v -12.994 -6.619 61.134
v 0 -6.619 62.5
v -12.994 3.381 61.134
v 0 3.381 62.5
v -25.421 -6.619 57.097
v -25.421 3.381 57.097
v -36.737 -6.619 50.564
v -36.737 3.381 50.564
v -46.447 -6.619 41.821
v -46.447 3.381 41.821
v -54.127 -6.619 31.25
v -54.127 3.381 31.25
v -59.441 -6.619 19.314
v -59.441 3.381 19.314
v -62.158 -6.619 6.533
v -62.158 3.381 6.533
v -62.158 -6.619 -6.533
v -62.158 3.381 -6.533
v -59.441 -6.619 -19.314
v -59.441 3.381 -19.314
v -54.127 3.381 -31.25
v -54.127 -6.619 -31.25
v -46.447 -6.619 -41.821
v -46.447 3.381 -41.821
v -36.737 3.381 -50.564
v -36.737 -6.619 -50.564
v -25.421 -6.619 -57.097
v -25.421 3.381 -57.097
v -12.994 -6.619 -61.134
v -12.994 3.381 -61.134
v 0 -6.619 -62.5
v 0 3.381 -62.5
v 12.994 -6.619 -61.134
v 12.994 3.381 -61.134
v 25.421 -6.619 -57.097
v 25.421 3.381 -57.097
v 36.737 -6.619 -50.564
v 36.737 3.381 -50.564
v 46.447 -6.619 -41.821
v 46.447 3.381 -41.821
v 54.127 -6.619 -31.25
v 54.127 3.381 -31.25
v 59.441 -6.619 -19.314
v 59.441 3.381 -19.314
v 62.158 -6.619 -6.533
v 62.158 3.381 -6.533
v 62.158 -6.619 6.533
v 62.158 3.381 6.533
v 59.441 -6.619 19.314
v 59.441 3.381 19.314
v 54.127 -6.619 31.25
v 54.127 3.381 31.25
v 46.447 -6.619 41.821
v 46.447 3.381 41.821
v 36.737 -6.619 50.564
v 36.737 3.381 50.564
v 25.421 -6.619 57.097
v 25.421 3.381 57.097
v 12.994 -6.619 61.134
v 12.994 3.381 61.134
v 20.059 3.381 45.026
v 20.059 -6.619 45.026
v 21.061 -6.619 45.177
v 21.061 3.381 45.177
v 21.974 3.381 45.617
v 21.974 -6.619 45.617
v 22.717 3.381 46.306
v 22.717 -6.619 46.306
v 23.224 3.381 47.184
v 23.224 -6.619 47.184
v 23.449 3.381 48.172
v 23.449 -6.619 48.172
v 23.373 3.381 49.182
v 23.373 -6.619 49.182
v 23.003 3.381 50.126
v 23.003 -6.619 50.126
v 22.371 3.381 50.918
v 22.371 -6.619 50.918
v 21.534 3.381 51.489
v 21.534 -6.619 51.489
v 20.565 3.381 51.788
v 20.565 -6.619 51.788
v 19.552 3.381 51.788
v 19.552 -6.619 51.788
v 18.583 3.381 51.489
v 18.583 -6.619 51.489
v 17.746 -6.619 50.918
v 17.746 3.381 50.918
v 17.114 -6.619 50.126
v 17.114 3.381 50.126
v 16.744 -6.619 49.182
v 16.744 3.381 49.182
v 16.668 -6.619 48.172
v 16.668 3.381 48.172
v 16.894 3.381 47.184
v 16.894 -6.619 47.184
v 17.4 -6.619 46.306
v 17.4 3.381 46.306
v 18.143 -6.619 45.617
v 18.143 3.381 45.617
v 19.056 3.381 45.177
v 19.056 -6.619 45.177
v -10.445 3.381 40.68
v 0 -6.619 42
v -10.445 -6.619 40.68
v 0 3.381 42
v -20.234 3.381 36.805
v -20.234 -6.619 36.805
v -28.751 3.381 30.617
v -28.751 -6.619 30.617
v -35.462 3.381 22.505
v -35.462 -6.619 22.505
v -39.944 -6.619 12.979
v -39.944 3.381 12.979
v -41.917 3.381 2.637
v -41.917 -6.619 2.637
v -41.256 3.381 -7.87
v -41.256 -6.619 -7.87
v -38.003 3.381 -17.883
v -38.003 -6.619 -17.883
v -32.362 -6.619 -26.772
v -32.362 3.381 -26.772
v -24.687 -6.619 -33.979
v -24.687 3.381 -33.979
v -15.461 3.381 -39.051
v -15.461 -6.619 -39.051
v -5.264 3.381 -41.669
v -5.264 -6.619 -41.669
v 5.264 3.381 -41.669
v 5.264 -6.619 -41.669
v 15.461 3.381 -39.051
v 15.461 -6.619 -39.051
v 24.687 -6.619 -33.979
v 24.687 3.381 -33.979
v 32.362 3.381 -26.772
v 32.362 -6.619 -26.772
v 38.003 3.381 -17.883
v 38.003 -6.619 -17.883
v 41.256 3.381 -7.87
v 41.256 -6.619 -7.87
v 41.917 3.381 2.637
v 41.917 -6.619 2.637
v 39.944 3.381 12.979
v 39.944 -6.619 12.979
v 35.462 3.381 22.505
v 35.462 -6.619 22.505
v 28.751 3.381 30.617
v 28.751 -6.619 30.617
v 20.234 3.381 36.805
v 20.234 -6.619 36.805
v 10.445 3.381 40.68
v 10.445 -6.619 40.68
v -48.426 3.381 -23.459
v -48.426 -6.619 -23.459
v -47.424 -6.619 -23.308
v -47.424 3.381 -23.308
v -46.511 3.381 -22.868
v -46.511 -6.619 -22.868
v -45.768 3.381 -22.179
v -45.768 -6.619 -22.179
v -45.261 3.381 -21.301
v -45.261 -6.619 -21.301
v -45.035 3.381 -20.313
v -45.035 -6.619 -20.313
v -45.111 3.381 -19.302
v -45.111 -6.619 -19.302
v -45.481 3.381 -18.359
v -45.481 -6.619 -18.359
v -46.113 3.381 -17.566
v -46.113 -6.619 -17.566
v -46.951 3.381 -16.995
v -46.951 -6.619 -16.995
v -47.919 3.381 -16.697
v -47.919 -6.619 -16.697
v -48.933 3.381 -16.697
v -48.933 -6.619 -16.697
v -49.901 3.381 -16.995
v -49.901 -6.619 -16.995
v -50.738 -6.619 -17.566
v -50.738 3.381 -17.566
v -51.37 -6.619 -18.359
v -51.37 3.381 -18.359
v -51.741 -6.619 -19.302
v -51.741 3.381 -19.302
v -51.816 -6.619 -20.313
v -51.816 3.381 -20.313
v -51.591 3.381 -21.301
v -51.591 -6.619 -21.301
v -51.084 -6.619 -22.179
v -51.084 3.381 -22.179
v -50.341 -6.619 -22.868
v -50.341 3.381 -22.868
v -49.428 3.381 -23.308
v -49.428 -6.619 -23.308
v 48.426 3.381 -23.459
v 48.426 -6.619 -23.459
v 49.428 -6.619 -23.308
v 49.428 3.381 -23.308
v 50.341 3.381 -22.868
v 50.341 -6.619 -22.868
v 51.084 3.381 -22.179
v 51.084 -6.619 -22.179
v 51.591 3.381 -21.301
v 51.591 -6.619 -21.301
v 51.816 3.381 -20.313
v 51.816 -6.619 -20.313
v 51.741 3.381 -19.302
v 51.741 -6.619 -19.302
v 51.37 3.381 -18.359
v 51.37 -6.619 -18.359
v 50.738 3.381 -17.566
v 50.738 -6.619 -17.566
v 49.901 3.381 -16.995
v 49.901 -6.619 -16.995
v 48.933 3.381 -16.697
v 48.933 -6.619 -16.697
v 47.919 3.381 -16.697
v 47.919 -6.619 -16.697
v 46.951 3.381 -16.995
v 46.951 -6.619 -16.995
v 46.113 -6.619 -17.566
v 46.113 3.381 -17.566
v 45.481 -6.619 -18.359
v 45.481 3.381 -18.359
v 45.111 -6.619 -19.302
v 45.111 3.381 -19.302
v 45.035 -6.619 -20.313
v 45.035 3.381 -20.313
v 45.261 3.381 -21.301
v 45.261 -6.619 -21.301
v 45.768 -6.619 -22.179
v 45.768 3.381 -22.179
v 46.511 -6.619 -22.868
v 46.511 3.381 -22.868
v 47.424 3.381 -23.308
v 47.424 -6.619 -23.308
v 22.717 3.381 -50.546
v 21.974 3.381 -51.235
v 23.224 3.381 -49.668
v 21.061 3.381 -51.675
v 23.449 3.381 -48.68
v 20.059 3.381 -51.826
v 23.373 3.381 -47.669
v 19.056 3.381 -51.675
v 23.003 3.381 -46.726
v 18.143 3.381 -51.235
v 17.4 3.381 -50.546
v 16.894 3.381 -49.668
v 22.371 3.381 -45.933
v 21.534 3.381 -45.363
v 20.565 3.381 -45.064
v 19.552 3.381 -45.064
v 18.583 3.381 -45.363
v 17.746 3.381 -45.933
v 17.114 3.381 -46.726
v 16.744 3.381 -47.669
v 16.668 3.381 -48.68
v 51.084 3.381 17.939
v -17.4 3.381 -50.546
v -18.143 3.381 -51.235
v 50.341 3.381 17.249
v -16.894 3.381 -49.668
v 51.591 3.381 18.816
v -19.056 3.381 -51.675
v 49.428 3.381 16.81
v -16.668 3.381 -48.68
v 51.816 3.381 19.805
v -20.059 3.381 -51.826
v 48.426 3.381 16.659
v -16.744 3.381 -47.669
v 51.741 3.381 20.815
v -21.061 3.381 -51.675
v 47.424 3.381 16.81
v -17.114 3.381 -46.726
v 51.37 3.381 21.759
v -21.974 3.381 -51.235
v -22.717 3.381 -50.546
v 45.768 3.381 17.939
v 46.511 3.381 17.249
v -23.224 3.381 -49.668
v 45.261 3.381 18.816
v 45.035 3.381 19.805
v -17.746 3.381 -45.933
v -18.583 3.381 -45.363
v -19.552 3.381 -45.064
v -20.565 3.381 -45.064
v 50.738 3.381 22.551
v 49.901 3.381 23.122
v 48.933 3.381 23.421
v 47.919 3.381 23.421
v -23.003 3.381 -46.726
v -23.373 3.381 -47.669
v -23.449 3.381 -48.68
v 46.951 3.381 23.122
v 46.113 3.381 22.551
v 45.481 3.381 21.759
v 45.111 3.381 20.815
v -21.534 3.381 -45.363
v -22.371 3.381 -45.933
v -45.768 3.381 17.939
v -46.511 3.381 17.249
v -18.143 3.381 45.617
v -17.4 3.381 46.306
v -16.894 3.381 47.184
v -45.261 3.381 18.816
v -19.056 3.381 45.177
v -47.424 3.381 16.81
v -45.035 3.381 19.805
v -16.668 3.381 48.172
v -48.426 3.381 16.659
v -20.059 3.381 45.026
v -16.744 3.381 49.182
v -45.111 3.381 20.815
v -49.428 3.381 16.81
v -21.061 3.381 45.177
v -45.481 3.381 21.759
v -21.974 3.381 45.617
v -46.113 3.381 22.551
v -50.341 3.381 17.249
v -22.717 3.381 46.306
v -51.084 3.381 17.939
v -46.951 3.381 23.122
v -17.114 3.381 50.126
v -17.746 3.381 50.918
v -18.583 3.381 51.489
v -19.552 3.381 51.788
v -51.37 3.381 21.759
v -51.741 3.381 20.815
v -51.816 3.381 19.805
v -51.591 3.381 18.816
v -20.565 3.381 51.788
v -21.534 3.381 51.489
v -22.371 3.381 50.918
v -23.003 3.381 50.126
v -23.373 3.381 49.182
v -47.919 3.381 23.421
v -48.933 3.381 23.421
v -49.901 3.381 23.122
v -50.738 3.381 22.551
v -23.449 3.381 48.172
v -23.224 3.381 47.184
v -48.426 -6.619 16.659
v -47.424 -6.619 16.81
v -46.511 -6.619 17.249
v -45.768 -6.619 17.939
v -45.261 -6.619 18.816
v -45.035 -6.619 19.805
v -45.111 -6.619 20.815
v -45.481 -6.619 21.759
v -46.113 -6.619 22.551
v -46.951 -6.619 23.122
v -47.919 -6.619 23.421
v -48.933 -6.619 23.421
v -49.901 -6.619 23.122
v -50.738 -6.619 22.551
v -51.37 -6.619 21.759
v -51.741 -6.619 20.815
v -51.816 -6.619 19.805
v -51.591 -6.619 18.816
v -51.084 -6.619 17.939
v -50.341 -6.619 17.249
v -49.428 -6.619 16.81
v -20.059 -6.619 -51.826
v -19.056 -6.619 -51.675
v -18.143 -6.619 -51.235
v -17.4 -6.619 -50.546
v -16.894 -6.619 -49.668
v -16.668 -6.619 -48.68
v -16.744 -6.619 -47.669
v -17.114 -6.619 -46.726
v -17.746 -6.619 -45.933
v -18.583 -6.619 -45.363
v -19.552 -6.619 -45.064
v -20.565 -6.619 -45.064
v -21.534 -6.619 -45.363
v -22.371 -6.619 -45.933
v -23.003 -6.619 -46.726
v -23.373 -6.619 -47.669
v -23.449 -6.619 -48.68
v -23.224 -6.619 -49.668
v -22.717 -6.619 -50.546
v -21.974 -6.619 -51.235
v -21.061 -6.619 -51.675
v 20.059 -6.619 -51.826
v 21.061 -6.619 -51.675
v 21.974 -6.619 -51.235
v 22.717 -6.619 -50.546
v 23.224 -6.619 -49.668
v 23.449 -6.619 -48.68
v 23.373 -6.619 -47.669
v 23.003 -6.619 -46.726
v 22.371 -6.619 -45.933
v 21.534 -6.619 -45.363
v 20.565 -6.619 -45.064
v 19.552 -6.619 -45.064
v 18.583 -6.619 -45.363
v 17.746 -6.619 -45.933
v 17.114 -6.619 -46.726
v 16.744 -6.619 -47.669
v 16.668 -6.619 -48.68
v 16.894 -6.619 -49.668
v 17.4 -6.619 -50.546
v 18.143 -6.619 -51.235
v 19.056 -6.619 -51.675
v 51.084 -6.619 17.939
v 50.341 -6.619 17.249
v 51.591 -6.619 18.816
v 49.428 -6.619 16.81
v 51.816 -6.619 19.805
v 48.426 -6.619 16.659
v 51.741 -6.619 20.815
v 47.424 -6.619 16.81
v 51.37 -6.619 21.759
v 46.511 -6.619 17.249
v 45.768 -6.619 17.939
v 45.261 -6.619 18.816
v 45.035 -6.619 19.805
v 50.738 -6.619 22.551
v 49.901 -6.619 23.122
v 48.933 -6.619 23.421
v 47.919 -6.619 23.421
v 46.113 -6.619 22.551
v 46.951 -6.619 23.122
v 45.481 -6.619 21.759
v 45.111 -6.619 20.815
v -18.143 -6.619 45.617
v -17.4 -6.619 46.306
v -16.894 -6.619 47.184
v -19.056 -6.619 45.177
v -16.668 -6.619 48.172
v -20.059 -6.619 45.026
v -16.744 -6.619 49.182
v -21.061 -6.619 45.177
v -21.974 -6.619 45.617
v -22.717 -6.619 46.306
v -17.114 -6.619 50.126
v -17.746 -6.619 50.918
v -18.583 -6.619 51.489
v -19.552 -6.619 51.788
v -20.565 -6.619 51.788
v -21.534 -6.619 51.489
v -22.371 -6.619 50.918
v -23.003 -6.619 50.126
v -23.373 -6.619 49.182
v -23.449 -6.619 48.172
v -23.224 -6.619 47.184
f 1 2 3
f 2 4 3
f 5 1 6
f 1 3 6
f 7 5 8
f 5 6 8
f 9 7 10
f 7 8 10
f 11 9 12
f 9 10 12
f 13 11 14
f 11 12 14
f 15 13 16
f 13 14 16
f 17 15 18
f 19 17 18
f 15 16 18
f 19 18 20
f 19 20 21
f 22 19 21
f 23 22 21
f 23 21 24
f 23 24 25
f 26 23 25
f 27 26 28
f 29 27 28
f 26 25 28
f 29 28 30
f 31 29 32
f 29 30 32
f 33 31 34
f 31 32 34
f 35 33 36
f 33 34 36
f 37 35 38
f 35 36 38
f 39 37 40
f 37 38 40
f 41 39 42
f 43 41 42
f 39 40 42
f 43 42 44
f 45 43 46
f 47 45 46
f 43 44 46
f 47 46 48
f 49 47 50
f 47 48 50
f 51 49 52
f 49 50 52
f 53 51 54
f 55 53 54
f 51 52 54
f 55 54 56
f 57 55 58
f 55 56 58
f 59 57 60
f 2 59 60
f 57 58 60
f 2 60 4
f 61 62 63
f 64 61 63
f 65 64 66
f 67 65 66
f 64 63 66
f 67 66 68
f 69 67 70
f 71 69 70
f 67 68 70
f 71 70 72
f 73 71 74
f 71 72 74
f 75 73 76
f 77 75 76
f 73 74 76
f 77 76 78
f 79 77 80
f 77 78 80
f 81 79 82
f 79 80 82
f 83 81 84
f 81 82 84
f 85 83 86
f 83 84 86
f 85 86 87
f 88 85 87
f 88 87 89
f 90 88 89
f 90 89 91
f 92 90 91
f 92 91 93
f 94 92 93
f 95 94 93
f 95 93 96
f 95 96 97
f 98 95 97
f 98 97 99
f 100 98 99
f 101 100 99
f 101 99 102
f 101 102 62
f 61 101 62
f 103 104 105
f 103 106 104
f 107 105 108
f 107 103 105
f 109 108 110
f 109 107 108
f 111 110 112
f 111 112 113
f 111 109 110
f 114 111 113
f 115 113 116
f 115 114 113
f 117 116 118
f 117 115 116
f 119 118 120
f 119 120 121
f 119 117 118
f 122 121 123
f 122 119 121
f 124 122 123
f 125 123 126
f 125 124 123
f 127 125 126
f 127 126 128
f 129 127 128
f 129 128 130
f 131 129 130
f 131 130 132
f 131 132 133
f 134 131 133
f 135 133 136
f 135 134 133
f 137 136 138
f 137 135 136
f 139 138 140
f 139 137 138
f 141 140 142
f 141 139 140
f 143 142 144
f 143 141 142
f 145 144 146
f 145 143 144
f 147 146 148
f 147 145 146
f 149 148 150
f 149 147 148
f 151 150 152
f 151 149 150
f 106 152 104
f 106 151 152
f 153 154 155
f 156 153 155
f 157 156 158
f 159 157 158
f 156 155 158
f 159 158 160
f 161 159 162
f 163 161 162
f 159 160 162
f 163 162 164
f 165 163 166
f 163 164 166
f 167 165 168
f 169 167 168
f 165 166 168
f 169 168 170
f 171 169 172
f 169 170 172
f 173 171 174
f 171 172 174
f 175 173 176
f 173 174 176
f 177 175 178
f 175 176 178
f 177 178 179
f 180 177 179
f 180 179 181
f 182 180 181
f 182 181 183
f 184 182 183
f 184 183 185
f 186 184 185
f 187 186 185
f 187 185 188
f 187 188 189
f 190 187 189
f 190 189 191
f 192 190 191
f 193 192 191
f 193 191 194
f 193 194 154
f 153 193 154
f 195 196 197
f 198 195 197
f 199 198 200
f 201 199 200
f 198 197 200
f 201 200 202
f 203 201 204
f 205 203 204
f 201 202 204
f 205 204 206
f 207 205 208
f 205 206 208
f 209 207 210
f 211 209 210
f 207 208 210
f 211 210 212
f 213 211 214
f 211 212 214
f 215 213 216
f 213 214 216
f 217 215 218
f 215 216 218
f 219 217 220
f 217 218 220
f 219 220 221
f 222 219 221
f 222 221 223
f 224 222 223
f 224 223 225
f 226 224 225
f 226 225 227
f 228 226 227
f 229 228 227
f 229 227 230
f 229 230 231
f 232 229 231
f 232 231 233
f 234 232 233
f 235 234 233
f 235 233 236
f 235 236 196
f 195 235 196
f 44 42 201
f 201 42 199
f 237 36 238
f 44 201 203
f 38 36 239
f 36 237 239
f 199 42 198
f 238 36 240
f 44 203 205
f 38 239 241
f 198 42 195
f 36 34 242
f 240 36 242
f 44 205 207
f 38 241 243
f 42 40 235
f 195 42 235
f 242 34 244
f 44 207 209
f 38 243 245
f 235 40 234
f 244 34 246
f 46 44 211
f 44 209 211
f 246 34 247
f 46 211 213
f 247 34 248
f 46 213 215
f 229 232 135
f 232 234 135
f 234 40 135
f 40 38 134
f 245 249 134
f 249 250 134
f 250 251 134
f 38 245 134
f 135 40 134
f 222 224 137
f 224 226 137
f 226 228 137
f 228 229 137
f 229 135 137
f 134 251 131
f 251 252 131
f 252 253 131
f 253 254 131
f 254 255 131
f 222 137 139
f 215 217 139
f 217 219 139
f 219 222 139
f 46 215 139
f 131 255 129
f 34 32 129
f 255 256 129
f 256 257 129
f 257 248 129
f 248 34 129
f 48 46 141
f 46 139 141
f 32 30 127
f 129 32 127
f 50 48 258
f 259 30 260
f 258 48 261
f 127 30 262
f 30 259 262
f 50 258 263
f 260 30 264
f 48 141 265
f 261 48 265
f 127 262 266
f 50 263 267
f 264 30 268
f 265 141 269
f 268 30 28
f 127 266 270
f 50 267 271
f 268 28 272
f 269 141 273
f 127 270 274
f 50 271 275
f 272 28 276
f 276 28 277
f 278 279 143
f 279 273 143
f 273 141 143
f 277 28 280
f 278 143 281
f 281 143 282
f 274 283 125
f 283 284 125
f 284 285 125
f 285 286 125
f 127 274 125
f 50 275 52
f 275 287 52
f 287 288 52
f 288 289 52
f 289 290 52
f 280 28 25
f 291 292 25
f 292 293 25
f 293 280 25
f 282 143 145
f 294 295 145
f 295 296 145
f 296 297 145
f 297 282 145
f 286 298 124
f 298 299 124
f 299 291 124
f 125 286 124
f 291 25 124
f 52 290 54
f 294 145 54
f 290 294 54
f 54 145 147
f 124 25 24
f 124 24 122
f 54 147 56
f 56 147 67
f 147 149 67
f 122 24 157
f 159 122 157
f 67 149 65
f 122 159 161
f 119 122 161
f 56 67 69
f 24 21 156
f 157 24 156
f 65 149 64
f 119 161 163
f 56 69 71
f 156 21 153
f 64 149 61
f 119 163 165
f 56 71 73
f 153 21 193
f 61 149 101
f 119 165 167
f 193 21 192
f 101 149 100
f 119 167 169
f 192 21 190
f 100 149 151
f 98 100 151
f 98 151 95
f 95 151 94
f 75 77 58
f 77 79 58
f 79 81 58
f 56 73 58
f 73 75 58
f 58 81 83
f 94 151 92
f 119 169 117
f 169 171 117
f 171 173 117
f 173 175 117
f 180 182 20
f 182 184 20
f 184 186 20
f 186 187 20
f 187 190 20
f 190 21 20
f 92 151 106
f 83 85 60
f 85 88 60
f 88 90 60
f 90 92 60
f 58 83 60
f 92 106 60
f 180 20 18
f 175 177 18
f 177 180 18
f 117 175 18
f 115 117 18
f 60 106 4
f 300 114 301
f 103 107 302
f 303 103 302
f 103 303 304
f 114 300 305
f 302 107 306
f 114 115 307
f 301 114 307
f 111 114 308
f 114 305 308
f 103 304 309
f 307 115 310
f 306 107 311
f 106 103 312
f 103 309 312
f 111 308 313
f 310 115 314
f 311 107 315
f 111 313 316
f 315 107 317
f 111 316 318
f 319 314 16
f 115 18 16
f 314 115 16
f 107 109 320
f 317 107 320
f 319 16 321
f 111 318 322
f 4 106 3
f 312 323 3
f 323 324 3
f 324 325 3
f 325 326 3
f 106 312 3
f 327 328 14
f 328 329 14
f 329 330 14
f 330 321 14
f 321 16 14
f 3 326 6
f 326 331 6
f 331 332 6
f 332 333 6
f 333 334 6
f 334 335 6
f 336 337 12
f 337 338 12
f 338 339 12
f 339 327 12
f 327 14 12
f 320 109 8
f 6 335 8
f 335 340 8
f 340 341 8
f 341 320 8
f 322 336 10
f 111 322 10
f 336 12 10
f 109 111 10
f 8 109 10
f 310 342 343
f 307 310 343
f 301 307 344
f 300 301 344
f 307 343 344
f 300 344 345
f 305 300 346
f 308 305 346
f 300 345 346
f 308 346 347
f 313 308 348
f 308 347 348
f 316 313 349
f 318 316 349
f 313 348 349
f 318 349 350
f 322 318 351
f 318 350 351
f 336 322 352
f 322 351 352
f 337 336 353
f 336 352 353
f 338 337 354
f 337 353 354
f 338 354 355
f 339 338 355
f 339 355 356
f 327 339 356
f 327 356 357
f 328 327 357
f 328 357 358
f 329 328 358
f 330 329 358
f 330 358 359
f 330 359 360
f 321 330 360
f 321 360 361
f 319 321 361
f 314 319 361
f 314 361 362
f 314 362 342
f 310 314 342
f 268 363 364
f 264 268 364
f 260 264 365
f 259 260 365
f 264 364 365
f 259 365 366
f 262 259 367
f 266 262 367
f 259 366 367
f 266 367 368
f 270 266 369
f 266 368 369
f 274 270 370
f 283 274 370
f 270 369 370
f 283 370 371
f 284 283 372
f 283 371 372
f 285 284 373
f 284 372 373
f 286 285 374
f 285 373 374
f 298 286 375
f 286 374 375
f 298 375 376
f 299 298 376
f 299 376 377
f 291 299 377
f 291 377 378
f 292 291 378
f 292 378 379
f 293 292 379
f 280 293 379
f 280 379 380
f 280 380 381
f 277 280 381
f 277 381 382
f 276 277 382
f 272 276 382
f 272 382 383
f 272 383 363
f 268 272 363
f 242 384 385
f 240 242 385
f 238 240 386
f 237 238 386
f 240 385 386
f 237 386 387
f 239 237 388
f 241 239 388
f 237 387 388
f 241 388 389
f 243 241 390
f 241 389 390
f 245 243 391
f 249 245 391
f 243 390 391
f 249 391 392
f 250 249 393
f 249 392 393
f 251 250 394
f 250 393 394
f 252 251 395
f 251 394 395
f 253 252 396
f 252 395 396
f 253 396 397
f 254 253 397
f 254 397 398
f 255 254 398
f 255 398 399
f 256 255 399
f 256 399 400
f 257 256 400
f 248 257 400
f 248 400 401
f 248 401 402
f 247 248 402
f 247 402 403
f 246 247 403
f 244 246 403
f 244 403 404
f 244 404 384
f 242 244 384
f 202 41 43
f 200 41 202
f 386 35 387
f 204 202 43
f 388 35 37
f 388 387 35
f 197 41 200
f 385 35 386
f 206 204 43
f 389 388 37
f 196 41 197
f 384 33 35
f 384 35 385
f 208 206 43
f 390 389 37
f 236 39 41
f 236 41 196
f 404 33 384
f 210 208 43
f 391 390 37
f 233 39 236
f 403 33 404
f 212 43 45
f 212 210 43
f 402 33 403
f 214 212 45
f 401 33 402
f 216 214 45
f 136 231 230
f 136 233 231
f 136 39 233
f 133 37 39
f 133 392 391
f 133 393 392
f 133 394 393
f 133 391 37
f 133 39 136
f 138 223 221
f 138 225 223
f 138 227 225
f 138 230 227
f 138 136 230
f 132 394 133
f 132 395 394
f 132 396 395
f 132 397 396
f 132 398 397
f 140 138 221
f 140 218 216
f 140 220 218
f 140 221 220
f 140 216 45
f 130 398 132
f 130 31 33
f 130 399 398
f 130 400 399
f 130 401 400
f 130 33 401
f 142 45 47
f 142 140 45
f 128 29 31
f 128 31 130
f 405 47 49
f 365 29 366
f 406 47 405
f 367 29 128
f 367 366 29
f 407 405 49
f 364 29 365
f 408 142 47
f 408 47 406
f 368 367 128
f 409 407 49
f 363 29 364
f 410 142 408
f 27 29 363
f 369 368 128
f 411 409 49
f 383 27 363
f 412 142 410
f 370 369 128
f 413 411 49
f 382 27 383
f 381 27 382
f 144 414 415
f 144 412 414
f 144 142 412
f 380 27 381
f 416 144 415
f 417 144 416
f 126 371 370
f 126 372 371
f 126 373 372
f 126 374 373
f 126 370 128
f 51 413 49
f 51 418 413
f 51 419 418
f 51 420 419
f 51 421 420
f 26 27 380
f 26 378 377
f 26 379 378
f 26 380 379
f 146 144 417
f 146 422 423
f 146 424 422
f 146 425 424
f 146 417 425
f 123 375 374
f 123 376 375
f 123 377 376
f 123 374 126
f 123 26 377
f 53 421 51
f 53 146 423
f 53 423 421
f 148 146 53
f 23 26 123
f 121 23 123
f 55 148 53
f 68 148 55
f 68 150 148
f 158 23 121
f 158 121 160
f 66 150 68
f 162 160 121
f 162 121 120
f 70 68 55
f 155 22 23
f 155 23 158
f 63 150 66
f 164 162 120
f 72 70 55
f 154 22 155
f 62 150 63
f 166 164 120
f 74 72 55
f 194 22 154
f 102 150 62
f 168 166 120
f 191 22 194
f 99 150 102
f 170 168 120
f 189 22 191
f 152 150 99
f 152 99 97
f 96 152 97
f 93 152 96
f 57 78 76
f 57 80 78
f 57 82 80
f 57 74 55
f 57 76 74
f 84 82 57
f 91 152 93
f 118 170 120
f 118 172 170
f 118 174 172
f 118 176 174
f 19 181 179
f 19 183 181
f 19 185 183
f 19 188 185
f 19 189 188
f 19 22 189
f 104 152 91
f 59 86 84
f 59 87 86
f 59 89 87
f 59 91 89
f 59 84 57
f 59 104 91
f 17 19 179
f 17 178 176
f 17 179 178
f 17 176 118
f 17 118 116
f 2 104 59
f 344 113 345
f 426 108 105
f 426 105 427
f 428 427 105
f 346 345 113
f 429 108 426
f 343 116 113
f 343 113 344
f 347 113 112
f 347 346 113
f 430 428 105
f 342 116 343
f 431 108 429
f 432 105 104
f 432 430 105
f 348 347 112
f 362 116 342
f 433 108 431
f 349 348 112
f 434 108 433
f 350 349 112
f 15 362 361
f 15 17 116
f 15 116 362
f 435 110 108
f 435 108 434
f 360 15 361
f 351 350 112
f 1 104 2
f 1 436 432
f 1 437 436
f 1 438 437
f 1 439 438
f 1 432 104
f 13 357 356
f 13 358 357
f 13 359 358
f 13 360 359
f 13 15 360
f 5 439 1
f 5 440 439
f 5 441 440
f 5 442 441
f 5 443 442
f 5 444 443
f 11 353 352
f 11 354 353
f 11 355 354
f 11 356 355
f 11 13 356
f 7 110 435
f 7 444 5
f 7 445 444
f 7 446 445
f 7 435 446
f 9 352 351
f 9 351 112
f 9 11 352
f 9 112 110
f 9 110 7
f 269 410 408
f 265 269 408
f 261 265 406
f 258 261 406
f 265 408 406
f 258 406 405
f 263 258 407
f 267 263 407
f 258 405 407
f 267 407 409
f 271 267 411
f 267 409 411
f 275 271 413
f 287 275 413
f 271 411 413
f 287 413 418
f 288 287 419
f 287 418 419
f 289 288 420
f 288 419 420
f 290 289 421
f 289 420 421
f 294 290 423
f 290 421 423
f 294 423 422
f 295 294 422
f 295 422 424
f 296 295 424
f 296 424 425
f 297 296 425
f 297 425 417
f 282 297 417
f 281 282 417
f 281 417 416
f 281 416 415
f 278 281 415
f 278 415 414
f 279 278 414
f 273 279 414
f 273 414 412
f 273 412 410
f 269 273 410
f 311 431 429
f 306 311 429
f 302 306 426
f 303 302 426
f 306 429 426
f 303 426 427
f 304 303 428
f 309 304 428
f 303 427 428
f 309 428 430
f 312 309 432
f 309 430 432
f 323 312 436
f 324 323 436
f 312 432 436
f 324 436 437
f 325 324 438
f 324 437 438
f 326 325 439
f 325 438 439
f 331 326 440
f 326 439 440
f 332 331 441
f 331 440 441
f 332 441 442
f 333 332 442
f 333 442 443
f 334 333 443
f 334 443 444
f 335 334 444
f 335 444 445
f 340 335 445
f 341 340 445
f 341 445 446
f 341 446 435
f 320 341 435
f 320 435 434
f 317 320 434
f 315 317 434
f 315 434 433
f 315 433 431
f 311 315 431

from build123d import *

# Parameters (mm, degrees)
SZKIC1_W               = 20.5
SZKIC1_H               = 10
OTW_R_GWINTOWANY_M81_D = 6.8


with BuildPart() as part:
    # Szkic1 → Obrót1 (revolve)
    with BuildSketch(Plane.XY, mode=Mode.PRIVATE) as obr_t1_sk:
        with Locations((-52.25, -1.619007804)):
            Rectangle(SZKIC1_W, SZKIC1_H)
    revolve(obr_t1_sk.sketch.rotate(Axis((0, 12.15490524, 0), (0, -1, 0)), 270), axis=Axis((0, 12.15490524, 0), (0, -1, 0)))

    # Otwór gwintowany M81 (through all)
    with Locations(Plane(origin=(-20.058639265, 3.380992196, -48.425838957), x_dir=(0, 0, 1), z_dir=(0, 1, 0))):
        with Locations((0, 0), (0, 40.11727853), (28.367199692, 68.484478222), (68.484478222, 68.484478222), (96.851677914, 40.11727853), (96.851677914, 0), (68.484478222, -28.367199692), (28.367199692, -28.367199692)):
            Hole(OTW_R_GWINTOWANY_M81_D / 2)


solid = part.part
